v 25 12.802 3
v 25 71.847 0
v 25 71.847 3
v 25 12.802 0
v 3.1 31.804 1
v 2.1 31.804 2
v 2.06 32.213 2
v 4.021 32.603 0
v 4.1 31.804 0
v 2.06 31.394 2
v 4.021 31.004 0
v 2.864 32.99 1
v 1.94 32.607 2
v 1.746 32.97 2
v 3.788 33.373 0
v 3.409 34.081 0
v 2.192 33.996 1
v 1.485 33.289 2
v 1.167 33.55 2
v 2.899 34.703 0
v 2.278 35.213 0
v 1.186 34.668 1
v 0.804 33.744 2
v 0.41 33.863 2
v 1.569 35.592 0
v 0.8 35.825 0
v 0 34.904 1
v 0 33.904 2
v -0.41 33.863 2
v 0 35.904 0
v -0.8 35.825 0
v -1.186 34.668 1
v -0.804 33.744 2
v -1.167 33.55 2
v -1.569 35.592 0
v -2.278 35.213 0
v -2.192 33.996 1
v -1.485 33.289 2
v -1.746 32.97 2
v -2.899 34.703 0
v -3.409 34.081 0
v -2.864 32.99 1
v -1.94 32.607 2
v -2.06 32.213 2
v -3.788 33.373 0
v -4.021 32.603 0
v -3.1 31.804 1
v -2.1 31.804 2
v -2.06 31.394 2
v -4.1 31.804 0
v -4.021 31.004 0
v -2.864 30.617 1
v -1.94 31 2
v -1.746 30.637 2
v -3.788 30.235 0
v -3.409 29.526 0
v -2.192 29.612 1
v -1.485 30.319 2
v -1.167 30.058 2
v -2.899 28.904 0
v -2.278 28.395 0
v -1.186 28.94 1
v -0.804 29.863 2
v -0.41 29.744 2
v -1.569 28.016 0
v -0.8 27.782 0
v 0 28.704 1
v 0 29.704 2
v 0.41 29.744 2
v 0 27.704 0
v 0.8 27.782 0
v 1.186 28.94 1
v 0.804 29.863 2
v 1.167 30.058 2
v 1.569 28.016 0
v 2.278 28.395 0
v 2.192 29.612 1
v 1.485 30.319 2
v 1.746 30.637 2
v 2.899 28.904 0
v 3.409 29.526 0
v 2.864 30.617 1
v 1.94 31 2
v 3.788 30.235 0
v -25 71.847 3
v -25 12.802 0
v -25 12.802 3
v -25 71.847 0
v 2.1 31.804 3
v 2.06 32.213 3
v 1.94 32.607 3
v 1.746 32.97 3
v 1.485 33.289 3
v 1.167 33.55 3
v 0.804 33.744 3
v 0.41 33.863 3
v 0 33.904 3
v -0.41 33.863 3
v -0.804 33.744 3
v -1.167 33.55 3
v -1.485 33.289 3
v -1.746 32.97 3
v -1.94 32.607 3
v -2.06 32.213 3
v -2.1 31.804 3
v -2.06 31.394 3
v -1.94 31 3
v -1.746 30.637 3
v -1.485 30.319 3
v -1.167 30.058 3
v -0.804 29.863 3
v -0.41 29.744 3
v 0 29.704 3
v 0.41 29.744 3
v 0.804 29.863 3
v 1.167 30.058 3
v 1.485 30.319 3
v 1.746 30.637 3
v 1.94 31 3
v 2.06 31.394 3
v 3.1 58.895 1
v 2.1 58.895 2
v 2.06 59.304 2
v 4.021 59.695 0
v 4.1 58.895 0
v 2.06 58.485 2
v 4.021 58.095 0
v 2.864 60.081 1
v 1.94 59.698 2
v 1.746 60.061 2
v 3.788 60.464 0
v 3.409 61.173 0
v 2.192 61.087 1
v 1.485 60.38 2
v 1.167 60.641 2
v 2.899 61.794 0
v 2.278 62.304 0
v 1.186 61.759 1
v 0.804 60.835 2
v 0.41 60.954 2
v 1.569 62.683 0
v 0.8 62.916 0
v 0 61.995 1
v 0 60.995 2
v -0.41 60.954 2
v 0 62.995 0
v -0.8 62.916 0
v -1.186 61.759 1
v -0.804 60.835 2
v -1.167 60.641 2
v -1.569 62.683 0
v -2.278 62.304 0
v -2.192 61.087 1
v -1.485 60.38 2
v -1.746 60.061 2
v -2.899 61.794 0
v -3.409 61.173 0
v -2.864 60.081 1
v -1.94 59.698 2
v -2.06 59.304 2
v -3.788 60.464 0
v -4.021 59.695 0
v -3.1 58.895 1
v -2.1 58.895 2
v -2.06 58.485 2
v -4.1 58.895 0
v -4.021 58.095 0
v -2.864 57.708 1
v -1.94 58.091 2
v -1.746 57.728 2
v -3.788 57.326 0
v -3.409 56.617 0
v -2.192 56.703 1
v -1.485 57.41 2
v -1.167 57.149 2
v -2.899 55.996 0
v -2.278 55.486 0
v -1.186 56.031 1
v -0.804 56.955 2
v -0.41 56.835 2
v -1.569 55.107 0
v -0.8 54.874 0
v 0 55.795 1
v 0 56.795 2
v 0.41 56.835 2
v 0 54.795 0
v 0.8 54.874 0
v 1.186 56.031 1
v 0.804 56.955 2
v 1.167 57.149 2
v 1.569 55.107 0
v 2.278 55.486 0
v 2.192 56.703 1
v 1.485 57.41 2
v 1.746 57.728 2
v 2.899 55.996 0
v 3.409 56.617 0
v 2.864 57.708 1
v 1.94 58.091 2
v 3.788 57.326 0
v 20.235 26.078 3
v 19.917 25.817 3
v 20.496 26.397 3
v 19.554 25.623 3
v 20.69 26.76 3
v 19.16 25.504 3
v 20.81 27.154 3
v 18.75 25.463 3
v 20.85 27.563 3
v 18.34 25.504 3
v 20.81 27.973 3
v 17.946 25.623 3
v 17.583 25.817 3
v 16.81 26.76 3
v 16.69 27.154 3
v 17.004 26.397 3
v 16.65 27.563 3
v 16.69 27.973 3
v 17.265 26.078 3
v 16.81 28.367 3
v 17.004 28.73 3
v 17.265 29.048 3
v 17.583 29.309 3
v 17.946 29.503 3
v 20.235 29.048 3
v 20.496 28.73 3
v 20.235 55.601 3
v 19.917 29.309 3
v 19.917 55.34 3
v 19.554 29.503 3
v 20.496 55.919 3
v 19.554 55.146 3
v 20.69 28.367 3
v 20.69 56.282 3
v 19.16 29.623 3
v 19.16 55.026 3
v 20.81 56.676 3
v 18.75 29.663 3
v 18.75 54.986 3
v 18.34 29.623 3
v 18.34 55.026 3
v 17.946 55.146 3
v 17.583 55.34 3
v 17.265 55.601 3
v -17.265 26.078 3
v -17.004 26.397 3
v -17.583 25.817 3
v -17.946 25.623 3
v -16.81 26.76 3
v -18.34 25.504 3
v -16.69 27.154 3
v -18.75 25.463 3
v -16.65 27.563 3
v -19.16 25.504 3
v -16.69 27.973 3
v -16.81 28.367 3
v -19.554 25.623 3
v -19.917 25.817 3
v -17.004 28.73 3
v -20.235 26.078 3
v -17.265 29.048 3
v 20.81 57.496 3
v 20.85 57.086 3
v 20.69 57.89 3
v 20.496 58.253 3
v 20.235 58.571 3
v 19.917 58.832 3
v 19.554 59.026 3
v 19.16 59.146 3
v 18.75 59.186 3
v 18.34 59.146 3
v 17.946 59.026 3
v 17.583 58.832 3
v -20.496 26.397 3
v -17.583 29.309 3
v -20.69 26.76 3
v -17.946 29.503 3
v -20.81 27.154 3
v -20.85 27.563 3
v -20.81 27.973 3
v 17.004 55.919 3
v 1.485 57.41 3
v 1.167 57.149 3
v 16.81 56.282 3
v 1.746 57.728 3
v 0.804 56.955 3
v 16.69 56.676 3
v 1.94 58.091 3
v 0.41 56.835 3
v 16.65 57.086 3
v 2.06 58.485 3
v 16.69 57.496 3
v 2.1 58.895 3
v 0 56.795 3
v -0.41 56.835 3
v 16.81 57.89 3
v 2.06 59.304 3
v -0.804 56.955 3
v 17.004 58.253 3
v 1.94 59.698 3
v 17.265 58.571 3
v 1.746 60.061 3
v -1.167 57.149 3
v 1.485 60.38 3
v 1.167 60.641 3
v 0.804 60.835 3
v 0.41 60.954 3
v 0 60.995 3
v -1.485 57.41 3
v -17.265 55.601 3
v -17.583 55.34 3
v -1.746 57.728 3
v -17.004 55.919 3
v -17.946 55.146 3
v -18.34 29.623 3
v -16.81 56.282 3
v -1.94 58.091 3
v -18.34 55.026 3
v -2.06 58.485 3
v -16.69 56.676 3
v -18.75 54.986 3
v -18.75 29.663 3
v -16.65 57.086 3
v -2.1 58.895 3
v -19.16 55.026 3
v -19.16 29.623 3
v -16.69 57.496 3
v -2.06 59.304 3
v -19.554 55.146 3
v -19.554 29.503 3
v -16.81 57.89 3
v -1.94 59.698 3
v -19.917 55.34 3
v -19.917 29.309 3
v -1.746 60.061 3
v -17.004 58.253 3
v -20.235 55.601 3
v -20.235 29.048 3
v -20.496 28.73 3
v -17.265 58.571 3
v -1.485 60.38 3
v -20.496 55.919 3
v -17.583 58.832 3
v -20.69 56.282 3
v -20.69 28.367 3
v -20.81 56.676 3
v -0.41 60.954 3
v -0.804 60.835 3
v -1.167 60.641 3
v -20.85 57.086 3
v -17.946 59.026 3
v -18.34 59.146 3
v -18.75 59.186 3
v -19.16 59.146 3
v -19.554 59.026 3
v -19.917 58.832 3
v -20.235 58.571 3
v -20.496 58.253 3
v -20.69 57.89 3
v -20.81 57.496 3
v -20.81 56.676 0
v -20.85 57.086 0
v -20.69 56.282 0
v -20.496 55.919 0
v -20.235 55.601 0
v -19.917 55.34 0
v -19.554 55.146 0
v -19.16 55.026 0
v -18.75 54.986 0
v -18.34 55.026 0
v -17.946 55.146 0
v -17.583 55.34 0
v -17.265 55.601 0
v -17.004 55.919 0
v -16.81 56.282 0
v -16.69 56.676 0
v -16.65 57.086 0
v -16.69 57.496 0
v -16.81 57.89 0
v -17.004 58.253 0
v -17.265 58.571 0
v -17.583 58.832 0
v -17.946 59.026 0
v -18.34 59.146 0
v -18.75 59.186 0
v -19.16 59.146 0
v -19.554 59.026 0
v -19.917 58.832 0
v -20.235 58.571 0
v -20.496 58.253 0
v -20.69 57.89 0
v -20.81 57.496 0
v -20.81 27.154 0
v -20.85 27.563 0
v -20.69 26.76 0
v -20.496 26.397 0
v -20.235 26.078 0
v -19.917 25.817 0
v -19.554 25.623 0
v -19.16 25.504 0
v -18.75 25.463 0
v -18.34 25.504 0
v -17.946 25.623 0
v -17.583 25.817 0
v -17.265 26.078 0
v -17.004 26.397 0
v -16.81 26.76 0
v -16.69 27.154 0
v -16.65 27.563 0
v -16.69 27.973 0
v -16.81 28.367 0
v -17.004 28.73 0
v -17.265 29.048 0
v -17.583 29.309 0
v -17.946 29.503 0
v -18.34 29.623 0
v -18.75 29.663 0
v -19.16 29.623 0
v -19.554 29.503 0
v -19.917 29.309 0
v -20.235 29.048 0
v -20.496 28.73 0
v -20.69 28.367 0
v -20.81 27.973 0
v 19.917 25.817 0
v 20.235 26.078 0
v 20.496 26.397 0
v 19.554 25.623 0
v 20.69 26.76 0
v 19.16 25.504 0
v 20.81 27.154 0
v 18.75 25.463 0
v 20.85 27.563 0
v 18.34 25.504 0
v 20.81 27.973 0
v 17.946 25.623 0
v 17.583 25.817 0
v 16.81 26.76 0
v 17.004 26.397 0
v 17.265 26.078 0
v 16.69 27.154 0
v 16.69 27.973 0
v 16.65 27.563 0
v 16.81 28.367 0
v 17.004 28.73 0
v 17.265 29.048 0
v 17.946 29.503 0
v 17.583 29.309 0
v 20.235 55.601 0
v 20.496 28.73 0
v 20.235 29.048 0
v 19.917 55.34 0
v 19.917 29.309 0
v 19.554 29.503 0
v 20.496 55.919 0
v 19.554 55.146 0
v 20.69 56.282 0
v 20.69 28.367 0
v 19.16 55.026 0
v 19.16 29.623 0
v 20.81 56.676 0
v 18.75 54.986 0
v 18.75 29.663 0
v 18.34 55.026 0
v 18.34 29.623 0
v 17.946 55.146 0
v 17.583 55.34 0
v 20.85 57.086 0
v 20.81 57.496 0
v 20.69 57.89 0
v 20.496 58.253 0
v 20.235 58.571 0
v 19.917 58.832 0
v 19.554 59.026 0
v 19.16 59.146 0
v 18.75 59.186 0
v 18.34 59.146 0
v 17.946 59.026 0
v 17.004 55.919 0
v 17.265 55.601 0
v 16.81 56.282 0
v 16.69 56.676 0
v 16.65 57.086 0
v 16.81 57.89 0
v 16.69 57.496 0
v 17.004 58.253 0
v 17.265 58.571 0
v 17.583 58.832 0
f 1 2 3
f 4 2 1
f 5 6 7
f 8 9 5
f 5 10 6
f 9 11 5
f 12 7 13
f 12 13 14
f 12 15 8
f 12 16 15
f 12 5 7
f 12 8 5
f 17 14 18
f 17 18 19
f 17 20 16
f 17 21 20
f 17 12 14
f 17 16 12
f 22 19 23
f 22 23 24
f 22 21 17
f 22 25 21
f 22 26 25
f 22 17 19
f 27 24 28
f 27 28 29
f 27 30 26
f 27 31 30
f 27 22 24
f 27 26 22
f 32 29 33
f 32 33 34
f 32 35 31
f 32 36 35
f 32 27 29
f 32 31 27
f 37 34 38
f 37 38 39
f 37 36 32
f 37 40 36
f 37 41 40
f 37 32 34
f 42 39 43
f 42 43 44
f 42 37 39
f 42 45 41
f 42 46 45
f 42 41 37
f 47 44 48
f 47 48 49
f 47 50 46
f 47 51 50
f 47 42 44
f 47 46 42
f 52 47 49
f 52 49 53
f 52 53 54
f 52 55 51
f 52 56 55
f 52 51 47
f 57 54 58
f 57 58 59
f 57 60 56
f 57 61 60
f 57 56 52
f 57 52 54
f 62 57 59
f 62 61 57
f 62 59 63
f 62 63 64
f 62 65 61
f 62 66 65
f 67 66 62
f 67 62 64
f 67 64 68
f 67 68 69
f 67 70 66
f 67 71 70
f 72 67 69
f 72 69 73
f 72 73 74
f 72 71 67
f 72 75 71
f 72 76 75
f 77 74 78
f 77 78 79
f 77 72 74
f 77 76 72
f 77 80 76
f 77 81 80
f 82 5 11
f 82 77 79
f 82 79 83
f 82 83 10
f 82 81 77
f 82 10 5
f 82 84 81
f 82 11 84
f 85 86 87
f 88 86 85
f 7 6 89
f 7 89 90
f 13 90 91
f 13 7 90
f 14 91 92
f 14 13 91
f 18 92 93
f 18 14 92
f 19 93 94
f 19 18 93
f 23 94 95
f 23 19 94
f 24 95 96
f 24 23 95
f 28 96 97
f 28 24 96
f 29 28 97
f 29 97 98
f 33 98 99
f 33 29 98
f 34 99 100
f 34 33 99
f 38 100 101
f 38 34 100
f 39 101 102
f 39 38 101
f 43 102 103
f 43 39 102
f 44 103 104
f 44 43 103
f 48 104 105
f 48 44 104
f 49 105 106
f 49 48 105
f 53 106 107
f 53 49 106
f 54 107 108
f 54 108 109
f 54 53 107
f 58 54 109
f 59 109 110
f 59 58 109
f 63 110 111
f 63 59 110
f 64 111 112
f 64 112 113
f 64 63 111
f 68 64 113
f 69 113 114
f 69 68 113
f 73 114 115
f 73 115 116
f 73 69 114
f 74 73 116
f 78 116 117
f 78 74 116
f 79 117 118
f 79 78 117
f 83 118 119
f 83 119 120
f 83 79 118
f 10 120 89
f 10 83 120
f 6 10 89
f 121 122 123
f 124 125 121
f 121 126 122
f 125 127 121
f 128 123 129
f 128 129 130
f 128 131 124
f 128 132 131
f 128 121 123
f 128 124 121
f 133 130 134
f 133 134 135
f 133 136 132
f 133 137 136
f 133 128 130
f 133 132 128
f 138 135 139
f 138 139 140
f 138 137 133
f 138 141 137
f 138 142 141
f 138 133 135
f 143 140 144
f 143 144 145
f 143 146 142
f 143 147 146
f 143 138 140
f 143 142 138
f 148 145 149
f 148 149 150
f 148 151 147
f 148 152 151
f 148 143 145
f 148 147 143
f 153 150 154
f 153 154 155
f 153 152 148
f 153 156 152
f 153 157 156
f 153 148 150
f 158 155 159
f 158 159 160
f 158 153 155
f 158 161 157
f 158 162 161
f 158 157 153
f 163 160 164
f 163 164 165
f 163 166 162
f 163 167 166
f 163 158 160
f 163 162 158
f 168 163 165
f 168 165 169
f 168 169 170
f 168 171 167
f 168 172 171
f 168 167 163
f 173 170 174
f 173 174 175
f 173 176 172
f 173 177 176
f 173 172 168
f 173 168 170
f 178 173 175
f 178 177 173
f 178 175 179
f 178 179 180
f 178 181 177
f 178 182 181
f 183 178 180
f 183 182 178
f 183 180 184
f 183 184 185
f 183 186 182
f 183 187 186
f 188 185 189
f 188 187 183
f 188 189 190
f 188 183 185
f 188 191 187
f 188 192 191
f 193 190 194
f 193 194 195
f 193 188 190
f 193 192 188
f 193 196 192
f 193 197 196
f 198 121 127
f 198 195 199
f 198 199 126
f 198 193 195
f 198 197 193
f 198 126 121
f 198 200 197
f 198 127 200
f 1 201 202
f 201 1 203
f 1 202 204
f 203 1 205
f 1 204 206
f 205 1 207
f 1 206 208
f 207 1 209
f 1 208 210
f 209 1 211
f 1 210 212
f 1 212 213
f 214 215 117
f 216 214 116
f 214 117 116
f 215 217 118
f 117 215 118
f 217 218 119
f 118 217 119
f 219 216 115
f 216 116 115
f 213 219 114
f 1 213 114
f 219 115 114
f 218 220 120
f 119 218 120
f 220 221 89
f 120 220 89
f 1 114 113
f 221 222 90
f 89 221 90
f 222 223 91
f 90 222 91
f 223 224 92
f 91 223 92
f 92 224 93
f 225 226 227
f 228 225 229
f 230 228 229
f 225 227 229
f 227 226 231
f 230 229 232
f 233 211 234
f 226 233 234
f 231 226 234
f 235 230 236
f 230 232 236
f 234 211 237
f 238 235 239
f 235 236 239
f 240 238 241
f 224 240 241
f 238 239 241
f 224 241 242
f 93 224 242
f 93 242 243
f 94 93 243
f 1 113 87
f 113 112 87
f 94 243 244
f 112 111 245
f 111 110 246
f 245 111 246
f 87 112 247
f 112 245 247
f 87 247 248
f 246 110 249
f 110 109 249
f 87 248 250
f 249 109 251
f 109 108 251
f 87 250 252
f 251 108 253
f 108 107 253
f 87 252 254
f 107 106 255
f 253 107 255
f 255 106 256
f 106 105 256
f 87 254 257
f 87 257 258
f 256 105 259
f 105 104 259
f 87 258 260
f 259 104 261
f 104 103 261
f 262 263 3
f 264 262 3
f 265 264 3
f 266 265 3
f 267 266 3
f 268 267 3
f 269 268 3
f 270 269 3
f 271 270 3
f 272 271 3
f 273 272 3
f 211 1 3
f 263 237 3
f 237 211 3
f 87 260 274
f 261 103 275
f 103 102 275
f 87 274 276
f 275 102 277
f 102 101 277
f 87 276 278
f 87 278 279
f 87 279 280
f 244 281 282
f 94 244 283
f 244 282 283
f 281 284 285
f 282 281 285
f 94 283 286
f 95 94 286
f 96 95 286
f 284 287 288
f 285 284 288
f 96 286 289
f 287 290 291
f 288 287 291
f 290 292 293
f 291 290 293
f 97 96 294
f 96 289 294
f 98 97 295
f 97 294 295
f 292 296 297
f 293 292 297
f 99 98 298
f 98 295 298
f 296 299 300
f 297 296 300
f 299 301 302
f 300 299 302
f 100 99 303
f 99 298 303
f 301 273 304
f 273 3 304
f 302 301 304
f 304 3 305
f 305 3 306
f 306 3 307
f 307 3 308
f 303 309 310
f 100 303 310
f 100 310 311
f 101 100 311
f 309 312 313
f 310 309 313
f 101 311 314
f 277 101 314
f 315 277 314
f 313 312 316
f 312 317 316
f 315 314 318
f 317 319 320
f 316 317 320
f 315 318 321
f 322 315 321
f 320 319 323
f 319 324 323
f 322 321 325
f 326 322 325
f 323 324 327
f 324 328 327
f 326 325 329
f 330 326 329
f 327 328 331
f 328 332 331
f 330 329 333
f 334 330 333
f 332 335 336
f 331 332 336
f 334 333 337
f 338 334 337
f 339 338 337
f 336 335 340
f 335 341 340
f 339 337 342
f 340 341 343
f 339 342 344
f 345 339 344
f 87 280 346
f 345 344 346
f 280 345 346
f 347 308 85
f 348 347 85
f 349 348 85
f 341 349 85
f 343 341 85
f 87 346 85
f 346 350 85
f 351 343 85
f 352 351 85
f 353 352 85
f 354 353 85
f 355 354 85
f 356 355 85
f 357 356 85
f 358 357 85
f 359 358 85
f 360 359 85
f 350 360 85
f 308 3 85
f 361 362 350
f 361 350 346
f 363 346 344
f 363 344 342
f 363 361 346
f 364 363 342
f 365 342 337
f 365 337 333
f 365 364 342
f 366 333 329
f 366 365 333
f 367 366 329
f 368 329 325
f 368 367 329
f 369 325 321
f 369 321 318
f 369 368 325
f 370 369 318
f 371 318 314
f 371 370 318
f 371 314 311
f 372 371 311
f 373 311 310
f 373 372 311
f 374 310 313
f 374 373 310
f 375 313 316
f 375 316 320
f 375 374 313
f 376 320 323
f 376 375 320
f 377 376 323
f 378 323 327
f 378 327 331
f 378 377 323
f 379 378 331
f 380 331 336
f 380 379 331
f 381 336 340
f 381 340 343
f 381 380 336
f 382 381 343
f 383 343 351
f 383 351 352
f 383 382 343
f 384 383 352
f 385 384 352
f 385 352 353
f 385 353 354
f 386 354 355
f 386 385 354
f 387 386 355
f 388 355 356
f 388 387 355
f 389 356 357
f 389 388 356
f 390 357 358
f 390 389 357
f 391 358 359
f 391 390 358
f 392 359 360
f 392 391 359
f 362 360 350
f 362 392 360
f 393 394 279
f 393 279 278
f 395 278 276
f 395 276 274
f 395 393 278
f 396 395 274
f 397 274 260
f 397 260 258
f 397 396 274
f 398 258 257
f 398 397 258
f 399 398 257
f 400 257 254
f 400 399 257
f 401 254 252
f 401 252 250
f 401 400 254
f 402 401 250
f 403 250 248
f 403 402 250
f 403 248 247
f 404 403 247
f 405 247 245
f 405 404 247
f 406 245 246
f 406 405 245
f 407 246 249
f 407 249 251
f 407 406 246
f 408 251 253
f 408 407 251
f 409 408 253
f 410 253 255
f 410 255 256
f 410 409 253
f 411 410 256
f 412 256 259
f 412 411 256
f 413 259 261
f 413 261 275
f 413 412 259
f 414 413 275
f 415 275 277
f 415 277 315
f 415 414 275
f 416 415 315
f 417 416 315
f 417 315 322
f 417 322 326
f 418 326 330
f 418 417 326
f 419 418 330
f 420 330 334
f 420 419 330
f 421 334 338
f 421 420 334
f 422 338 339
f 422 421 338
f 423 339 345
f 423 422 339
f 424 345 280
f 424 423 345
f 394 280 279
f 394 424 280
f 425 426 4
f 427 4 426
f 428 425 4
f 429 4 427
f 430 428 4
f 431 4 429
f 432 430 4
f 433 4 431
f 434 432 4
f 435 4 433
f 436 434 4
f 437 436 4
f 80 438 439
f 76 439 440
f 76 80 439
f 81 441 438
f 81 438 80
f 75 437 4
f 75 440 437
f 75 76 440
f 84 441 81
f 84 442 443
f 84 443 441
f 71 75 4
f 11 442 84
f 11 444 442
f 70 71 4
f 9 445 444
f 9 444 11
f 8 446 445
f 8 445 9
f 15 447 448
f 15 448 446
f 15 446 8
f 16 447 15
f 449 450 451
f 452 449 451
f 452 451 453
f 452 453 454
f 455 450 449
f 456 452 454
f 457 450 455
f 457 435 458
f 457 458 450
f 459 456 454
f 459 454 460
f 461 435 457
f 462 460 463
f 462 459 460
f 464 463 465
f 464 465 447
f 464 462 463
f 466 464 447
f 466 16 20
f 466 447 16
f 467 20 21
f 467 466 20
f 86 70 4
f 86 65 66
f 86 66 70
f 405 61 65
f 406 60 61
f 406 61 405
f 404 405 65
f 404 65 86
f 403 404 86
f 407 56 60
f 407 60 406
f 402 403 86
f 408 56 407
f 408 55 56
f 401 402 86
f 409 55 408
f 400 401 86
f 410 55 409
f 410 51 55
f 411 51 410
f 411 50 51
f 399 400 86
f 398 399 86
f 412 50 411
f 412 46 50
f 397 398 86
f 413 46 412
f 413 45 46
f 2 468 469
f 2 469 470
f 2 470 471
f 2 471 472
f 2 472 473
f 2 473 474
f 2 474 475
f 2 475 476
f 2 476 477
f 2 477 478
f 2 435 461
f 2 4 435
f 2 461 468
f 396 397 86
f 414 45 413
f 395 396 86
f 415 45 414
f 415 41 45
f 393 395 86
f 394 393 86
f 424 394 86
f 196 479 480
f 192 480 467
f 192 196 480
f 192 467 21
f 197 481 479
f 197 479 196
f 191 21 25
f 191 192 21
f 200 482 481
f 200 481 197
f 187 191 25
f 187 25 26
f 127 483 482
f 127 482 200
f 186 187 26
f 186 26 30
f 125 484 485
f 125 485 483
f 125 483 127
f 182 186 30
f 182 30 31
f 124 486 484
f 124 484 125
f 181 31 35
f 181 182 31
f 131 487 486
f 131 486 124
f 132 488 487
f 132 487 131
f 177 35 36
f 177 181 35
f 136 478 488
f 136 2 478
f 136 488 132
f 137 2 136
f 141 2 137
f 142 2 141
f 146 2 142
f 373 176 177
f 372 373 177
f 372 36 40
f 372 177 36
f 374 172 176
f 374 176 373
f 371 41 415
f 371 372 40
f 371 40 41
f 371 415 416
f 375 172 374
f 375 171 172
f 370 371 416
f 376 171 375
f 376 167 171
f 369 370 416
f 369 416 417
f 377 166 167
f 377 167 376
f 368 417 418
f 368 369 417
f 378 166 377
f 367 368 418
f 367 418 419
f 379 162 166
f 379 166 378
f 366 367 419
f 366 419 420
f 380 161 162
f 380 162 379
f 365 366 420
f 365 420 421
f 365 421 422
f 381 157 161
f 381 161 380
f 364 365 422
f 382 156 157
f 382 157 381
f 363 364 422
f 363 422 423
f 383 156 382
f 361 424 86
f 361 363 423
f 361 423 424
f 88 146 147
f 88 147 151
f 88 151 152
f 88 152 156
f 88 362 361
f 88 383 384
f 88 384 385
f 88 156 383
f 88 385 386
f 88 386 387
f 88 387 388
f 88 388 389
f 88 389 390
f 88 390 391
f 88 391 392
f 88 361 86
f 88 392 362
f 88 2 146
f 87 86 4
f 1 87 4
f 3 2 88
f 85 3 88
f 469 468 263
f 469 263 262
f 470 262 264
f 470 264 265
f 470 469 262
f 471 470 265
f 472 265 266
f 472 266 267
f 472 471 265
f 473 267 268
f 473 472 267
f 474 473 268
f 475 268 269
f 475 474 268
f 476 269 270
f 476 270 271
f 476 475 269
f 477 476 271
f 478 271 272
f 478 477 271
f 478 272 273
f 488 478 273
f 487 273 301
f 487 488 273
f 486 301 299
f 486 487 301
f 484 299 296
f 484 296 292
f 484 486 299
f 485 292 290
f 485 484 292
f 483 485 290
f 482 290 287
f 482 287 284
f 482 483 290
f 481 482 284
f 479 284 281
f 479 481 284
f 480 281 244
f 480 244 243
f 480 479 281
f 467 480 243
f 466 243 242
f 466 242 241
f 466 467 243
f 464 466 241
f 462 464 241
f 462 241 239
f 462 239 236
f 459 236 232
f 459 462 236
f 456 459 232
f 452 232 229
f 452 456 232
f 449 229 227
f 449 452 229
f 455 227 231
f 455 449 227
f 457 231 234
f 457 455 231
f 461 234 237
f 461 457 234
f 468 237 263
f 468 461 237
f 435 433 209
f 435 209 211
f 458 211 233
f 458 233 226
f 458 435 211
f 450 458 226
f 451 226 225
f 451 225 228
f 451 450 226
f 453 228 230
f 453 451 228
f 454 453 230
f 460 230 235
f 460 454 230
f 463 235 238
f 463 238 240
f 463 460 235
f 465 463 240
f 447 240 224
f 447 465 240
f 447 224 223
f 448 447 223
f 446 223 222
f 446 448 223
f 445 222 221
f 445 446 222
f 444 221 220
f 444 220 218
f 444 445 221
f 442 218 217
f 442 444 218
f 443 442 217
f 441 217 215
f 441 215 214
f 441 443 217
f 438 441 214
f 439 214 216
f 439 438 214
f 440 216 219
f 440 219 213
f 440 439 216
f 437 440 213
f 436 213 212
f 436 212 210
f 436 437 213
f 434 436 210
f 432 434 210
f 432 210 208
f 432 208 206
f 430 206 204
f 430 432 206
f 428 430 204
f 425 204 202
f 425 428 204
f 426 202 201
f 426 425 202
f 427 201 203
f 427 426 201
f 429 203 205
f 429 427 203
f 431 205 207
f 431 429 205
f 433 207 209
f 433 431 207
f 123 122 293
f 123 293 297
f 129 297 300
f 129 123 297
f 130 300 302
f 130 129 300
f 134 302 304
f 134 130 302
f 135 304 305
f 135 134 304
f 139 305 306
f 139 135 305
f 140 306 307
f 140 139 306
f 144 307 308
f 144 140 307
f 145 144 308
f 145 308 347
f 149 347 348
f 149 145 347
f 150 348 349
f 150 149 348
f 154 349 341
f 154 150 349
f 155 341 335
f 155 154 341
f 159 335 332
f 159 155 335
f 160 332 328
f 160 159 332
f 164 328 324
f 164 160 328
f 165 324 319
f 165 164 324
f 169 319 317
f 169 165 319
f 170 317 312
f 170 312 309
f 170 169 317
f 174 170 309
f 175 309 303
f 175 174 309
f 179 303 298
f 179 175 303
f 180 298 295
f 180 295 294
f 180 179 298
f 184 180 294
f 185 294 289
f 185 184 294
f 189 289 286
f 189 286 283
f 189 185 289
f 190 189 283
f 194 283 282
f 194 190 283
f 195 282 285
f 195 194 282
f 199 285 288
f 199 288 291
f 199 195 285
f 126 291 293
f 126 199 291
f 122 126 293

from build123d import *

# Parameters (mm, degrees)
SCHIZZO1_R                   = 2.1
ESTRUSIONE_ESTRUSIONE1_DEPTH = 3
SMUSSO1_SIZE                 = 2


with BuildPart() as part:
    # Schizzo1 → Estrusione-Estrusione1 (new body)
    with BuildSketch(Plane.XY):
        Polygon((0, 71.847389048), (25, 71.847389048), (25, 12.801854913), (0, 12.801854913), (-25, 12.801854913), (-25, 71.847389048), align=None)
        with Locations((18.75, 57.086005514)):
            Circle(SCHIZZO1_R, mode=Mode.SUBTRACT)
        with Locations((18.75, 27.563238447)):
            Circle(SCHIZZO1_R, mode=Mode.SUBTRACT)
        with Locations(Location((-18.75, 27.563238447, 0), (0, 0, 180))):
            Circle(SCHIZZO1_R, mode=Mode.SUBTRACT)
        with Locations(Location((-18.75, 57.086005514, 0), (0, 0, 180))):
            Circle(SCHIZZO1_R, mode=Mode.SUBTRACT)
        with Locations((0, 58.89473309)):
            Circle(SCHIZZO1_R, mode=Mode.SUBTRACT)
        with Locations((0, 31.80362551)):
            Circle(SCHIZZO1_R, mode=Mode.SUBTRACT)
    extrude(amount=ESTRUSIONE_ESTRUSIONE1_DEPTH)

    # Smusso1
    smusso1_edges = [part.edges().sort_by_distance(p)[0] for p in [
        (-2.1, 58.89473309, 0),
        (-2.1, 31.80362551, 0),
    ]]
    chamfer(smusso1_edges, length=SMUSSO1_SIZE)


solid = part.part
